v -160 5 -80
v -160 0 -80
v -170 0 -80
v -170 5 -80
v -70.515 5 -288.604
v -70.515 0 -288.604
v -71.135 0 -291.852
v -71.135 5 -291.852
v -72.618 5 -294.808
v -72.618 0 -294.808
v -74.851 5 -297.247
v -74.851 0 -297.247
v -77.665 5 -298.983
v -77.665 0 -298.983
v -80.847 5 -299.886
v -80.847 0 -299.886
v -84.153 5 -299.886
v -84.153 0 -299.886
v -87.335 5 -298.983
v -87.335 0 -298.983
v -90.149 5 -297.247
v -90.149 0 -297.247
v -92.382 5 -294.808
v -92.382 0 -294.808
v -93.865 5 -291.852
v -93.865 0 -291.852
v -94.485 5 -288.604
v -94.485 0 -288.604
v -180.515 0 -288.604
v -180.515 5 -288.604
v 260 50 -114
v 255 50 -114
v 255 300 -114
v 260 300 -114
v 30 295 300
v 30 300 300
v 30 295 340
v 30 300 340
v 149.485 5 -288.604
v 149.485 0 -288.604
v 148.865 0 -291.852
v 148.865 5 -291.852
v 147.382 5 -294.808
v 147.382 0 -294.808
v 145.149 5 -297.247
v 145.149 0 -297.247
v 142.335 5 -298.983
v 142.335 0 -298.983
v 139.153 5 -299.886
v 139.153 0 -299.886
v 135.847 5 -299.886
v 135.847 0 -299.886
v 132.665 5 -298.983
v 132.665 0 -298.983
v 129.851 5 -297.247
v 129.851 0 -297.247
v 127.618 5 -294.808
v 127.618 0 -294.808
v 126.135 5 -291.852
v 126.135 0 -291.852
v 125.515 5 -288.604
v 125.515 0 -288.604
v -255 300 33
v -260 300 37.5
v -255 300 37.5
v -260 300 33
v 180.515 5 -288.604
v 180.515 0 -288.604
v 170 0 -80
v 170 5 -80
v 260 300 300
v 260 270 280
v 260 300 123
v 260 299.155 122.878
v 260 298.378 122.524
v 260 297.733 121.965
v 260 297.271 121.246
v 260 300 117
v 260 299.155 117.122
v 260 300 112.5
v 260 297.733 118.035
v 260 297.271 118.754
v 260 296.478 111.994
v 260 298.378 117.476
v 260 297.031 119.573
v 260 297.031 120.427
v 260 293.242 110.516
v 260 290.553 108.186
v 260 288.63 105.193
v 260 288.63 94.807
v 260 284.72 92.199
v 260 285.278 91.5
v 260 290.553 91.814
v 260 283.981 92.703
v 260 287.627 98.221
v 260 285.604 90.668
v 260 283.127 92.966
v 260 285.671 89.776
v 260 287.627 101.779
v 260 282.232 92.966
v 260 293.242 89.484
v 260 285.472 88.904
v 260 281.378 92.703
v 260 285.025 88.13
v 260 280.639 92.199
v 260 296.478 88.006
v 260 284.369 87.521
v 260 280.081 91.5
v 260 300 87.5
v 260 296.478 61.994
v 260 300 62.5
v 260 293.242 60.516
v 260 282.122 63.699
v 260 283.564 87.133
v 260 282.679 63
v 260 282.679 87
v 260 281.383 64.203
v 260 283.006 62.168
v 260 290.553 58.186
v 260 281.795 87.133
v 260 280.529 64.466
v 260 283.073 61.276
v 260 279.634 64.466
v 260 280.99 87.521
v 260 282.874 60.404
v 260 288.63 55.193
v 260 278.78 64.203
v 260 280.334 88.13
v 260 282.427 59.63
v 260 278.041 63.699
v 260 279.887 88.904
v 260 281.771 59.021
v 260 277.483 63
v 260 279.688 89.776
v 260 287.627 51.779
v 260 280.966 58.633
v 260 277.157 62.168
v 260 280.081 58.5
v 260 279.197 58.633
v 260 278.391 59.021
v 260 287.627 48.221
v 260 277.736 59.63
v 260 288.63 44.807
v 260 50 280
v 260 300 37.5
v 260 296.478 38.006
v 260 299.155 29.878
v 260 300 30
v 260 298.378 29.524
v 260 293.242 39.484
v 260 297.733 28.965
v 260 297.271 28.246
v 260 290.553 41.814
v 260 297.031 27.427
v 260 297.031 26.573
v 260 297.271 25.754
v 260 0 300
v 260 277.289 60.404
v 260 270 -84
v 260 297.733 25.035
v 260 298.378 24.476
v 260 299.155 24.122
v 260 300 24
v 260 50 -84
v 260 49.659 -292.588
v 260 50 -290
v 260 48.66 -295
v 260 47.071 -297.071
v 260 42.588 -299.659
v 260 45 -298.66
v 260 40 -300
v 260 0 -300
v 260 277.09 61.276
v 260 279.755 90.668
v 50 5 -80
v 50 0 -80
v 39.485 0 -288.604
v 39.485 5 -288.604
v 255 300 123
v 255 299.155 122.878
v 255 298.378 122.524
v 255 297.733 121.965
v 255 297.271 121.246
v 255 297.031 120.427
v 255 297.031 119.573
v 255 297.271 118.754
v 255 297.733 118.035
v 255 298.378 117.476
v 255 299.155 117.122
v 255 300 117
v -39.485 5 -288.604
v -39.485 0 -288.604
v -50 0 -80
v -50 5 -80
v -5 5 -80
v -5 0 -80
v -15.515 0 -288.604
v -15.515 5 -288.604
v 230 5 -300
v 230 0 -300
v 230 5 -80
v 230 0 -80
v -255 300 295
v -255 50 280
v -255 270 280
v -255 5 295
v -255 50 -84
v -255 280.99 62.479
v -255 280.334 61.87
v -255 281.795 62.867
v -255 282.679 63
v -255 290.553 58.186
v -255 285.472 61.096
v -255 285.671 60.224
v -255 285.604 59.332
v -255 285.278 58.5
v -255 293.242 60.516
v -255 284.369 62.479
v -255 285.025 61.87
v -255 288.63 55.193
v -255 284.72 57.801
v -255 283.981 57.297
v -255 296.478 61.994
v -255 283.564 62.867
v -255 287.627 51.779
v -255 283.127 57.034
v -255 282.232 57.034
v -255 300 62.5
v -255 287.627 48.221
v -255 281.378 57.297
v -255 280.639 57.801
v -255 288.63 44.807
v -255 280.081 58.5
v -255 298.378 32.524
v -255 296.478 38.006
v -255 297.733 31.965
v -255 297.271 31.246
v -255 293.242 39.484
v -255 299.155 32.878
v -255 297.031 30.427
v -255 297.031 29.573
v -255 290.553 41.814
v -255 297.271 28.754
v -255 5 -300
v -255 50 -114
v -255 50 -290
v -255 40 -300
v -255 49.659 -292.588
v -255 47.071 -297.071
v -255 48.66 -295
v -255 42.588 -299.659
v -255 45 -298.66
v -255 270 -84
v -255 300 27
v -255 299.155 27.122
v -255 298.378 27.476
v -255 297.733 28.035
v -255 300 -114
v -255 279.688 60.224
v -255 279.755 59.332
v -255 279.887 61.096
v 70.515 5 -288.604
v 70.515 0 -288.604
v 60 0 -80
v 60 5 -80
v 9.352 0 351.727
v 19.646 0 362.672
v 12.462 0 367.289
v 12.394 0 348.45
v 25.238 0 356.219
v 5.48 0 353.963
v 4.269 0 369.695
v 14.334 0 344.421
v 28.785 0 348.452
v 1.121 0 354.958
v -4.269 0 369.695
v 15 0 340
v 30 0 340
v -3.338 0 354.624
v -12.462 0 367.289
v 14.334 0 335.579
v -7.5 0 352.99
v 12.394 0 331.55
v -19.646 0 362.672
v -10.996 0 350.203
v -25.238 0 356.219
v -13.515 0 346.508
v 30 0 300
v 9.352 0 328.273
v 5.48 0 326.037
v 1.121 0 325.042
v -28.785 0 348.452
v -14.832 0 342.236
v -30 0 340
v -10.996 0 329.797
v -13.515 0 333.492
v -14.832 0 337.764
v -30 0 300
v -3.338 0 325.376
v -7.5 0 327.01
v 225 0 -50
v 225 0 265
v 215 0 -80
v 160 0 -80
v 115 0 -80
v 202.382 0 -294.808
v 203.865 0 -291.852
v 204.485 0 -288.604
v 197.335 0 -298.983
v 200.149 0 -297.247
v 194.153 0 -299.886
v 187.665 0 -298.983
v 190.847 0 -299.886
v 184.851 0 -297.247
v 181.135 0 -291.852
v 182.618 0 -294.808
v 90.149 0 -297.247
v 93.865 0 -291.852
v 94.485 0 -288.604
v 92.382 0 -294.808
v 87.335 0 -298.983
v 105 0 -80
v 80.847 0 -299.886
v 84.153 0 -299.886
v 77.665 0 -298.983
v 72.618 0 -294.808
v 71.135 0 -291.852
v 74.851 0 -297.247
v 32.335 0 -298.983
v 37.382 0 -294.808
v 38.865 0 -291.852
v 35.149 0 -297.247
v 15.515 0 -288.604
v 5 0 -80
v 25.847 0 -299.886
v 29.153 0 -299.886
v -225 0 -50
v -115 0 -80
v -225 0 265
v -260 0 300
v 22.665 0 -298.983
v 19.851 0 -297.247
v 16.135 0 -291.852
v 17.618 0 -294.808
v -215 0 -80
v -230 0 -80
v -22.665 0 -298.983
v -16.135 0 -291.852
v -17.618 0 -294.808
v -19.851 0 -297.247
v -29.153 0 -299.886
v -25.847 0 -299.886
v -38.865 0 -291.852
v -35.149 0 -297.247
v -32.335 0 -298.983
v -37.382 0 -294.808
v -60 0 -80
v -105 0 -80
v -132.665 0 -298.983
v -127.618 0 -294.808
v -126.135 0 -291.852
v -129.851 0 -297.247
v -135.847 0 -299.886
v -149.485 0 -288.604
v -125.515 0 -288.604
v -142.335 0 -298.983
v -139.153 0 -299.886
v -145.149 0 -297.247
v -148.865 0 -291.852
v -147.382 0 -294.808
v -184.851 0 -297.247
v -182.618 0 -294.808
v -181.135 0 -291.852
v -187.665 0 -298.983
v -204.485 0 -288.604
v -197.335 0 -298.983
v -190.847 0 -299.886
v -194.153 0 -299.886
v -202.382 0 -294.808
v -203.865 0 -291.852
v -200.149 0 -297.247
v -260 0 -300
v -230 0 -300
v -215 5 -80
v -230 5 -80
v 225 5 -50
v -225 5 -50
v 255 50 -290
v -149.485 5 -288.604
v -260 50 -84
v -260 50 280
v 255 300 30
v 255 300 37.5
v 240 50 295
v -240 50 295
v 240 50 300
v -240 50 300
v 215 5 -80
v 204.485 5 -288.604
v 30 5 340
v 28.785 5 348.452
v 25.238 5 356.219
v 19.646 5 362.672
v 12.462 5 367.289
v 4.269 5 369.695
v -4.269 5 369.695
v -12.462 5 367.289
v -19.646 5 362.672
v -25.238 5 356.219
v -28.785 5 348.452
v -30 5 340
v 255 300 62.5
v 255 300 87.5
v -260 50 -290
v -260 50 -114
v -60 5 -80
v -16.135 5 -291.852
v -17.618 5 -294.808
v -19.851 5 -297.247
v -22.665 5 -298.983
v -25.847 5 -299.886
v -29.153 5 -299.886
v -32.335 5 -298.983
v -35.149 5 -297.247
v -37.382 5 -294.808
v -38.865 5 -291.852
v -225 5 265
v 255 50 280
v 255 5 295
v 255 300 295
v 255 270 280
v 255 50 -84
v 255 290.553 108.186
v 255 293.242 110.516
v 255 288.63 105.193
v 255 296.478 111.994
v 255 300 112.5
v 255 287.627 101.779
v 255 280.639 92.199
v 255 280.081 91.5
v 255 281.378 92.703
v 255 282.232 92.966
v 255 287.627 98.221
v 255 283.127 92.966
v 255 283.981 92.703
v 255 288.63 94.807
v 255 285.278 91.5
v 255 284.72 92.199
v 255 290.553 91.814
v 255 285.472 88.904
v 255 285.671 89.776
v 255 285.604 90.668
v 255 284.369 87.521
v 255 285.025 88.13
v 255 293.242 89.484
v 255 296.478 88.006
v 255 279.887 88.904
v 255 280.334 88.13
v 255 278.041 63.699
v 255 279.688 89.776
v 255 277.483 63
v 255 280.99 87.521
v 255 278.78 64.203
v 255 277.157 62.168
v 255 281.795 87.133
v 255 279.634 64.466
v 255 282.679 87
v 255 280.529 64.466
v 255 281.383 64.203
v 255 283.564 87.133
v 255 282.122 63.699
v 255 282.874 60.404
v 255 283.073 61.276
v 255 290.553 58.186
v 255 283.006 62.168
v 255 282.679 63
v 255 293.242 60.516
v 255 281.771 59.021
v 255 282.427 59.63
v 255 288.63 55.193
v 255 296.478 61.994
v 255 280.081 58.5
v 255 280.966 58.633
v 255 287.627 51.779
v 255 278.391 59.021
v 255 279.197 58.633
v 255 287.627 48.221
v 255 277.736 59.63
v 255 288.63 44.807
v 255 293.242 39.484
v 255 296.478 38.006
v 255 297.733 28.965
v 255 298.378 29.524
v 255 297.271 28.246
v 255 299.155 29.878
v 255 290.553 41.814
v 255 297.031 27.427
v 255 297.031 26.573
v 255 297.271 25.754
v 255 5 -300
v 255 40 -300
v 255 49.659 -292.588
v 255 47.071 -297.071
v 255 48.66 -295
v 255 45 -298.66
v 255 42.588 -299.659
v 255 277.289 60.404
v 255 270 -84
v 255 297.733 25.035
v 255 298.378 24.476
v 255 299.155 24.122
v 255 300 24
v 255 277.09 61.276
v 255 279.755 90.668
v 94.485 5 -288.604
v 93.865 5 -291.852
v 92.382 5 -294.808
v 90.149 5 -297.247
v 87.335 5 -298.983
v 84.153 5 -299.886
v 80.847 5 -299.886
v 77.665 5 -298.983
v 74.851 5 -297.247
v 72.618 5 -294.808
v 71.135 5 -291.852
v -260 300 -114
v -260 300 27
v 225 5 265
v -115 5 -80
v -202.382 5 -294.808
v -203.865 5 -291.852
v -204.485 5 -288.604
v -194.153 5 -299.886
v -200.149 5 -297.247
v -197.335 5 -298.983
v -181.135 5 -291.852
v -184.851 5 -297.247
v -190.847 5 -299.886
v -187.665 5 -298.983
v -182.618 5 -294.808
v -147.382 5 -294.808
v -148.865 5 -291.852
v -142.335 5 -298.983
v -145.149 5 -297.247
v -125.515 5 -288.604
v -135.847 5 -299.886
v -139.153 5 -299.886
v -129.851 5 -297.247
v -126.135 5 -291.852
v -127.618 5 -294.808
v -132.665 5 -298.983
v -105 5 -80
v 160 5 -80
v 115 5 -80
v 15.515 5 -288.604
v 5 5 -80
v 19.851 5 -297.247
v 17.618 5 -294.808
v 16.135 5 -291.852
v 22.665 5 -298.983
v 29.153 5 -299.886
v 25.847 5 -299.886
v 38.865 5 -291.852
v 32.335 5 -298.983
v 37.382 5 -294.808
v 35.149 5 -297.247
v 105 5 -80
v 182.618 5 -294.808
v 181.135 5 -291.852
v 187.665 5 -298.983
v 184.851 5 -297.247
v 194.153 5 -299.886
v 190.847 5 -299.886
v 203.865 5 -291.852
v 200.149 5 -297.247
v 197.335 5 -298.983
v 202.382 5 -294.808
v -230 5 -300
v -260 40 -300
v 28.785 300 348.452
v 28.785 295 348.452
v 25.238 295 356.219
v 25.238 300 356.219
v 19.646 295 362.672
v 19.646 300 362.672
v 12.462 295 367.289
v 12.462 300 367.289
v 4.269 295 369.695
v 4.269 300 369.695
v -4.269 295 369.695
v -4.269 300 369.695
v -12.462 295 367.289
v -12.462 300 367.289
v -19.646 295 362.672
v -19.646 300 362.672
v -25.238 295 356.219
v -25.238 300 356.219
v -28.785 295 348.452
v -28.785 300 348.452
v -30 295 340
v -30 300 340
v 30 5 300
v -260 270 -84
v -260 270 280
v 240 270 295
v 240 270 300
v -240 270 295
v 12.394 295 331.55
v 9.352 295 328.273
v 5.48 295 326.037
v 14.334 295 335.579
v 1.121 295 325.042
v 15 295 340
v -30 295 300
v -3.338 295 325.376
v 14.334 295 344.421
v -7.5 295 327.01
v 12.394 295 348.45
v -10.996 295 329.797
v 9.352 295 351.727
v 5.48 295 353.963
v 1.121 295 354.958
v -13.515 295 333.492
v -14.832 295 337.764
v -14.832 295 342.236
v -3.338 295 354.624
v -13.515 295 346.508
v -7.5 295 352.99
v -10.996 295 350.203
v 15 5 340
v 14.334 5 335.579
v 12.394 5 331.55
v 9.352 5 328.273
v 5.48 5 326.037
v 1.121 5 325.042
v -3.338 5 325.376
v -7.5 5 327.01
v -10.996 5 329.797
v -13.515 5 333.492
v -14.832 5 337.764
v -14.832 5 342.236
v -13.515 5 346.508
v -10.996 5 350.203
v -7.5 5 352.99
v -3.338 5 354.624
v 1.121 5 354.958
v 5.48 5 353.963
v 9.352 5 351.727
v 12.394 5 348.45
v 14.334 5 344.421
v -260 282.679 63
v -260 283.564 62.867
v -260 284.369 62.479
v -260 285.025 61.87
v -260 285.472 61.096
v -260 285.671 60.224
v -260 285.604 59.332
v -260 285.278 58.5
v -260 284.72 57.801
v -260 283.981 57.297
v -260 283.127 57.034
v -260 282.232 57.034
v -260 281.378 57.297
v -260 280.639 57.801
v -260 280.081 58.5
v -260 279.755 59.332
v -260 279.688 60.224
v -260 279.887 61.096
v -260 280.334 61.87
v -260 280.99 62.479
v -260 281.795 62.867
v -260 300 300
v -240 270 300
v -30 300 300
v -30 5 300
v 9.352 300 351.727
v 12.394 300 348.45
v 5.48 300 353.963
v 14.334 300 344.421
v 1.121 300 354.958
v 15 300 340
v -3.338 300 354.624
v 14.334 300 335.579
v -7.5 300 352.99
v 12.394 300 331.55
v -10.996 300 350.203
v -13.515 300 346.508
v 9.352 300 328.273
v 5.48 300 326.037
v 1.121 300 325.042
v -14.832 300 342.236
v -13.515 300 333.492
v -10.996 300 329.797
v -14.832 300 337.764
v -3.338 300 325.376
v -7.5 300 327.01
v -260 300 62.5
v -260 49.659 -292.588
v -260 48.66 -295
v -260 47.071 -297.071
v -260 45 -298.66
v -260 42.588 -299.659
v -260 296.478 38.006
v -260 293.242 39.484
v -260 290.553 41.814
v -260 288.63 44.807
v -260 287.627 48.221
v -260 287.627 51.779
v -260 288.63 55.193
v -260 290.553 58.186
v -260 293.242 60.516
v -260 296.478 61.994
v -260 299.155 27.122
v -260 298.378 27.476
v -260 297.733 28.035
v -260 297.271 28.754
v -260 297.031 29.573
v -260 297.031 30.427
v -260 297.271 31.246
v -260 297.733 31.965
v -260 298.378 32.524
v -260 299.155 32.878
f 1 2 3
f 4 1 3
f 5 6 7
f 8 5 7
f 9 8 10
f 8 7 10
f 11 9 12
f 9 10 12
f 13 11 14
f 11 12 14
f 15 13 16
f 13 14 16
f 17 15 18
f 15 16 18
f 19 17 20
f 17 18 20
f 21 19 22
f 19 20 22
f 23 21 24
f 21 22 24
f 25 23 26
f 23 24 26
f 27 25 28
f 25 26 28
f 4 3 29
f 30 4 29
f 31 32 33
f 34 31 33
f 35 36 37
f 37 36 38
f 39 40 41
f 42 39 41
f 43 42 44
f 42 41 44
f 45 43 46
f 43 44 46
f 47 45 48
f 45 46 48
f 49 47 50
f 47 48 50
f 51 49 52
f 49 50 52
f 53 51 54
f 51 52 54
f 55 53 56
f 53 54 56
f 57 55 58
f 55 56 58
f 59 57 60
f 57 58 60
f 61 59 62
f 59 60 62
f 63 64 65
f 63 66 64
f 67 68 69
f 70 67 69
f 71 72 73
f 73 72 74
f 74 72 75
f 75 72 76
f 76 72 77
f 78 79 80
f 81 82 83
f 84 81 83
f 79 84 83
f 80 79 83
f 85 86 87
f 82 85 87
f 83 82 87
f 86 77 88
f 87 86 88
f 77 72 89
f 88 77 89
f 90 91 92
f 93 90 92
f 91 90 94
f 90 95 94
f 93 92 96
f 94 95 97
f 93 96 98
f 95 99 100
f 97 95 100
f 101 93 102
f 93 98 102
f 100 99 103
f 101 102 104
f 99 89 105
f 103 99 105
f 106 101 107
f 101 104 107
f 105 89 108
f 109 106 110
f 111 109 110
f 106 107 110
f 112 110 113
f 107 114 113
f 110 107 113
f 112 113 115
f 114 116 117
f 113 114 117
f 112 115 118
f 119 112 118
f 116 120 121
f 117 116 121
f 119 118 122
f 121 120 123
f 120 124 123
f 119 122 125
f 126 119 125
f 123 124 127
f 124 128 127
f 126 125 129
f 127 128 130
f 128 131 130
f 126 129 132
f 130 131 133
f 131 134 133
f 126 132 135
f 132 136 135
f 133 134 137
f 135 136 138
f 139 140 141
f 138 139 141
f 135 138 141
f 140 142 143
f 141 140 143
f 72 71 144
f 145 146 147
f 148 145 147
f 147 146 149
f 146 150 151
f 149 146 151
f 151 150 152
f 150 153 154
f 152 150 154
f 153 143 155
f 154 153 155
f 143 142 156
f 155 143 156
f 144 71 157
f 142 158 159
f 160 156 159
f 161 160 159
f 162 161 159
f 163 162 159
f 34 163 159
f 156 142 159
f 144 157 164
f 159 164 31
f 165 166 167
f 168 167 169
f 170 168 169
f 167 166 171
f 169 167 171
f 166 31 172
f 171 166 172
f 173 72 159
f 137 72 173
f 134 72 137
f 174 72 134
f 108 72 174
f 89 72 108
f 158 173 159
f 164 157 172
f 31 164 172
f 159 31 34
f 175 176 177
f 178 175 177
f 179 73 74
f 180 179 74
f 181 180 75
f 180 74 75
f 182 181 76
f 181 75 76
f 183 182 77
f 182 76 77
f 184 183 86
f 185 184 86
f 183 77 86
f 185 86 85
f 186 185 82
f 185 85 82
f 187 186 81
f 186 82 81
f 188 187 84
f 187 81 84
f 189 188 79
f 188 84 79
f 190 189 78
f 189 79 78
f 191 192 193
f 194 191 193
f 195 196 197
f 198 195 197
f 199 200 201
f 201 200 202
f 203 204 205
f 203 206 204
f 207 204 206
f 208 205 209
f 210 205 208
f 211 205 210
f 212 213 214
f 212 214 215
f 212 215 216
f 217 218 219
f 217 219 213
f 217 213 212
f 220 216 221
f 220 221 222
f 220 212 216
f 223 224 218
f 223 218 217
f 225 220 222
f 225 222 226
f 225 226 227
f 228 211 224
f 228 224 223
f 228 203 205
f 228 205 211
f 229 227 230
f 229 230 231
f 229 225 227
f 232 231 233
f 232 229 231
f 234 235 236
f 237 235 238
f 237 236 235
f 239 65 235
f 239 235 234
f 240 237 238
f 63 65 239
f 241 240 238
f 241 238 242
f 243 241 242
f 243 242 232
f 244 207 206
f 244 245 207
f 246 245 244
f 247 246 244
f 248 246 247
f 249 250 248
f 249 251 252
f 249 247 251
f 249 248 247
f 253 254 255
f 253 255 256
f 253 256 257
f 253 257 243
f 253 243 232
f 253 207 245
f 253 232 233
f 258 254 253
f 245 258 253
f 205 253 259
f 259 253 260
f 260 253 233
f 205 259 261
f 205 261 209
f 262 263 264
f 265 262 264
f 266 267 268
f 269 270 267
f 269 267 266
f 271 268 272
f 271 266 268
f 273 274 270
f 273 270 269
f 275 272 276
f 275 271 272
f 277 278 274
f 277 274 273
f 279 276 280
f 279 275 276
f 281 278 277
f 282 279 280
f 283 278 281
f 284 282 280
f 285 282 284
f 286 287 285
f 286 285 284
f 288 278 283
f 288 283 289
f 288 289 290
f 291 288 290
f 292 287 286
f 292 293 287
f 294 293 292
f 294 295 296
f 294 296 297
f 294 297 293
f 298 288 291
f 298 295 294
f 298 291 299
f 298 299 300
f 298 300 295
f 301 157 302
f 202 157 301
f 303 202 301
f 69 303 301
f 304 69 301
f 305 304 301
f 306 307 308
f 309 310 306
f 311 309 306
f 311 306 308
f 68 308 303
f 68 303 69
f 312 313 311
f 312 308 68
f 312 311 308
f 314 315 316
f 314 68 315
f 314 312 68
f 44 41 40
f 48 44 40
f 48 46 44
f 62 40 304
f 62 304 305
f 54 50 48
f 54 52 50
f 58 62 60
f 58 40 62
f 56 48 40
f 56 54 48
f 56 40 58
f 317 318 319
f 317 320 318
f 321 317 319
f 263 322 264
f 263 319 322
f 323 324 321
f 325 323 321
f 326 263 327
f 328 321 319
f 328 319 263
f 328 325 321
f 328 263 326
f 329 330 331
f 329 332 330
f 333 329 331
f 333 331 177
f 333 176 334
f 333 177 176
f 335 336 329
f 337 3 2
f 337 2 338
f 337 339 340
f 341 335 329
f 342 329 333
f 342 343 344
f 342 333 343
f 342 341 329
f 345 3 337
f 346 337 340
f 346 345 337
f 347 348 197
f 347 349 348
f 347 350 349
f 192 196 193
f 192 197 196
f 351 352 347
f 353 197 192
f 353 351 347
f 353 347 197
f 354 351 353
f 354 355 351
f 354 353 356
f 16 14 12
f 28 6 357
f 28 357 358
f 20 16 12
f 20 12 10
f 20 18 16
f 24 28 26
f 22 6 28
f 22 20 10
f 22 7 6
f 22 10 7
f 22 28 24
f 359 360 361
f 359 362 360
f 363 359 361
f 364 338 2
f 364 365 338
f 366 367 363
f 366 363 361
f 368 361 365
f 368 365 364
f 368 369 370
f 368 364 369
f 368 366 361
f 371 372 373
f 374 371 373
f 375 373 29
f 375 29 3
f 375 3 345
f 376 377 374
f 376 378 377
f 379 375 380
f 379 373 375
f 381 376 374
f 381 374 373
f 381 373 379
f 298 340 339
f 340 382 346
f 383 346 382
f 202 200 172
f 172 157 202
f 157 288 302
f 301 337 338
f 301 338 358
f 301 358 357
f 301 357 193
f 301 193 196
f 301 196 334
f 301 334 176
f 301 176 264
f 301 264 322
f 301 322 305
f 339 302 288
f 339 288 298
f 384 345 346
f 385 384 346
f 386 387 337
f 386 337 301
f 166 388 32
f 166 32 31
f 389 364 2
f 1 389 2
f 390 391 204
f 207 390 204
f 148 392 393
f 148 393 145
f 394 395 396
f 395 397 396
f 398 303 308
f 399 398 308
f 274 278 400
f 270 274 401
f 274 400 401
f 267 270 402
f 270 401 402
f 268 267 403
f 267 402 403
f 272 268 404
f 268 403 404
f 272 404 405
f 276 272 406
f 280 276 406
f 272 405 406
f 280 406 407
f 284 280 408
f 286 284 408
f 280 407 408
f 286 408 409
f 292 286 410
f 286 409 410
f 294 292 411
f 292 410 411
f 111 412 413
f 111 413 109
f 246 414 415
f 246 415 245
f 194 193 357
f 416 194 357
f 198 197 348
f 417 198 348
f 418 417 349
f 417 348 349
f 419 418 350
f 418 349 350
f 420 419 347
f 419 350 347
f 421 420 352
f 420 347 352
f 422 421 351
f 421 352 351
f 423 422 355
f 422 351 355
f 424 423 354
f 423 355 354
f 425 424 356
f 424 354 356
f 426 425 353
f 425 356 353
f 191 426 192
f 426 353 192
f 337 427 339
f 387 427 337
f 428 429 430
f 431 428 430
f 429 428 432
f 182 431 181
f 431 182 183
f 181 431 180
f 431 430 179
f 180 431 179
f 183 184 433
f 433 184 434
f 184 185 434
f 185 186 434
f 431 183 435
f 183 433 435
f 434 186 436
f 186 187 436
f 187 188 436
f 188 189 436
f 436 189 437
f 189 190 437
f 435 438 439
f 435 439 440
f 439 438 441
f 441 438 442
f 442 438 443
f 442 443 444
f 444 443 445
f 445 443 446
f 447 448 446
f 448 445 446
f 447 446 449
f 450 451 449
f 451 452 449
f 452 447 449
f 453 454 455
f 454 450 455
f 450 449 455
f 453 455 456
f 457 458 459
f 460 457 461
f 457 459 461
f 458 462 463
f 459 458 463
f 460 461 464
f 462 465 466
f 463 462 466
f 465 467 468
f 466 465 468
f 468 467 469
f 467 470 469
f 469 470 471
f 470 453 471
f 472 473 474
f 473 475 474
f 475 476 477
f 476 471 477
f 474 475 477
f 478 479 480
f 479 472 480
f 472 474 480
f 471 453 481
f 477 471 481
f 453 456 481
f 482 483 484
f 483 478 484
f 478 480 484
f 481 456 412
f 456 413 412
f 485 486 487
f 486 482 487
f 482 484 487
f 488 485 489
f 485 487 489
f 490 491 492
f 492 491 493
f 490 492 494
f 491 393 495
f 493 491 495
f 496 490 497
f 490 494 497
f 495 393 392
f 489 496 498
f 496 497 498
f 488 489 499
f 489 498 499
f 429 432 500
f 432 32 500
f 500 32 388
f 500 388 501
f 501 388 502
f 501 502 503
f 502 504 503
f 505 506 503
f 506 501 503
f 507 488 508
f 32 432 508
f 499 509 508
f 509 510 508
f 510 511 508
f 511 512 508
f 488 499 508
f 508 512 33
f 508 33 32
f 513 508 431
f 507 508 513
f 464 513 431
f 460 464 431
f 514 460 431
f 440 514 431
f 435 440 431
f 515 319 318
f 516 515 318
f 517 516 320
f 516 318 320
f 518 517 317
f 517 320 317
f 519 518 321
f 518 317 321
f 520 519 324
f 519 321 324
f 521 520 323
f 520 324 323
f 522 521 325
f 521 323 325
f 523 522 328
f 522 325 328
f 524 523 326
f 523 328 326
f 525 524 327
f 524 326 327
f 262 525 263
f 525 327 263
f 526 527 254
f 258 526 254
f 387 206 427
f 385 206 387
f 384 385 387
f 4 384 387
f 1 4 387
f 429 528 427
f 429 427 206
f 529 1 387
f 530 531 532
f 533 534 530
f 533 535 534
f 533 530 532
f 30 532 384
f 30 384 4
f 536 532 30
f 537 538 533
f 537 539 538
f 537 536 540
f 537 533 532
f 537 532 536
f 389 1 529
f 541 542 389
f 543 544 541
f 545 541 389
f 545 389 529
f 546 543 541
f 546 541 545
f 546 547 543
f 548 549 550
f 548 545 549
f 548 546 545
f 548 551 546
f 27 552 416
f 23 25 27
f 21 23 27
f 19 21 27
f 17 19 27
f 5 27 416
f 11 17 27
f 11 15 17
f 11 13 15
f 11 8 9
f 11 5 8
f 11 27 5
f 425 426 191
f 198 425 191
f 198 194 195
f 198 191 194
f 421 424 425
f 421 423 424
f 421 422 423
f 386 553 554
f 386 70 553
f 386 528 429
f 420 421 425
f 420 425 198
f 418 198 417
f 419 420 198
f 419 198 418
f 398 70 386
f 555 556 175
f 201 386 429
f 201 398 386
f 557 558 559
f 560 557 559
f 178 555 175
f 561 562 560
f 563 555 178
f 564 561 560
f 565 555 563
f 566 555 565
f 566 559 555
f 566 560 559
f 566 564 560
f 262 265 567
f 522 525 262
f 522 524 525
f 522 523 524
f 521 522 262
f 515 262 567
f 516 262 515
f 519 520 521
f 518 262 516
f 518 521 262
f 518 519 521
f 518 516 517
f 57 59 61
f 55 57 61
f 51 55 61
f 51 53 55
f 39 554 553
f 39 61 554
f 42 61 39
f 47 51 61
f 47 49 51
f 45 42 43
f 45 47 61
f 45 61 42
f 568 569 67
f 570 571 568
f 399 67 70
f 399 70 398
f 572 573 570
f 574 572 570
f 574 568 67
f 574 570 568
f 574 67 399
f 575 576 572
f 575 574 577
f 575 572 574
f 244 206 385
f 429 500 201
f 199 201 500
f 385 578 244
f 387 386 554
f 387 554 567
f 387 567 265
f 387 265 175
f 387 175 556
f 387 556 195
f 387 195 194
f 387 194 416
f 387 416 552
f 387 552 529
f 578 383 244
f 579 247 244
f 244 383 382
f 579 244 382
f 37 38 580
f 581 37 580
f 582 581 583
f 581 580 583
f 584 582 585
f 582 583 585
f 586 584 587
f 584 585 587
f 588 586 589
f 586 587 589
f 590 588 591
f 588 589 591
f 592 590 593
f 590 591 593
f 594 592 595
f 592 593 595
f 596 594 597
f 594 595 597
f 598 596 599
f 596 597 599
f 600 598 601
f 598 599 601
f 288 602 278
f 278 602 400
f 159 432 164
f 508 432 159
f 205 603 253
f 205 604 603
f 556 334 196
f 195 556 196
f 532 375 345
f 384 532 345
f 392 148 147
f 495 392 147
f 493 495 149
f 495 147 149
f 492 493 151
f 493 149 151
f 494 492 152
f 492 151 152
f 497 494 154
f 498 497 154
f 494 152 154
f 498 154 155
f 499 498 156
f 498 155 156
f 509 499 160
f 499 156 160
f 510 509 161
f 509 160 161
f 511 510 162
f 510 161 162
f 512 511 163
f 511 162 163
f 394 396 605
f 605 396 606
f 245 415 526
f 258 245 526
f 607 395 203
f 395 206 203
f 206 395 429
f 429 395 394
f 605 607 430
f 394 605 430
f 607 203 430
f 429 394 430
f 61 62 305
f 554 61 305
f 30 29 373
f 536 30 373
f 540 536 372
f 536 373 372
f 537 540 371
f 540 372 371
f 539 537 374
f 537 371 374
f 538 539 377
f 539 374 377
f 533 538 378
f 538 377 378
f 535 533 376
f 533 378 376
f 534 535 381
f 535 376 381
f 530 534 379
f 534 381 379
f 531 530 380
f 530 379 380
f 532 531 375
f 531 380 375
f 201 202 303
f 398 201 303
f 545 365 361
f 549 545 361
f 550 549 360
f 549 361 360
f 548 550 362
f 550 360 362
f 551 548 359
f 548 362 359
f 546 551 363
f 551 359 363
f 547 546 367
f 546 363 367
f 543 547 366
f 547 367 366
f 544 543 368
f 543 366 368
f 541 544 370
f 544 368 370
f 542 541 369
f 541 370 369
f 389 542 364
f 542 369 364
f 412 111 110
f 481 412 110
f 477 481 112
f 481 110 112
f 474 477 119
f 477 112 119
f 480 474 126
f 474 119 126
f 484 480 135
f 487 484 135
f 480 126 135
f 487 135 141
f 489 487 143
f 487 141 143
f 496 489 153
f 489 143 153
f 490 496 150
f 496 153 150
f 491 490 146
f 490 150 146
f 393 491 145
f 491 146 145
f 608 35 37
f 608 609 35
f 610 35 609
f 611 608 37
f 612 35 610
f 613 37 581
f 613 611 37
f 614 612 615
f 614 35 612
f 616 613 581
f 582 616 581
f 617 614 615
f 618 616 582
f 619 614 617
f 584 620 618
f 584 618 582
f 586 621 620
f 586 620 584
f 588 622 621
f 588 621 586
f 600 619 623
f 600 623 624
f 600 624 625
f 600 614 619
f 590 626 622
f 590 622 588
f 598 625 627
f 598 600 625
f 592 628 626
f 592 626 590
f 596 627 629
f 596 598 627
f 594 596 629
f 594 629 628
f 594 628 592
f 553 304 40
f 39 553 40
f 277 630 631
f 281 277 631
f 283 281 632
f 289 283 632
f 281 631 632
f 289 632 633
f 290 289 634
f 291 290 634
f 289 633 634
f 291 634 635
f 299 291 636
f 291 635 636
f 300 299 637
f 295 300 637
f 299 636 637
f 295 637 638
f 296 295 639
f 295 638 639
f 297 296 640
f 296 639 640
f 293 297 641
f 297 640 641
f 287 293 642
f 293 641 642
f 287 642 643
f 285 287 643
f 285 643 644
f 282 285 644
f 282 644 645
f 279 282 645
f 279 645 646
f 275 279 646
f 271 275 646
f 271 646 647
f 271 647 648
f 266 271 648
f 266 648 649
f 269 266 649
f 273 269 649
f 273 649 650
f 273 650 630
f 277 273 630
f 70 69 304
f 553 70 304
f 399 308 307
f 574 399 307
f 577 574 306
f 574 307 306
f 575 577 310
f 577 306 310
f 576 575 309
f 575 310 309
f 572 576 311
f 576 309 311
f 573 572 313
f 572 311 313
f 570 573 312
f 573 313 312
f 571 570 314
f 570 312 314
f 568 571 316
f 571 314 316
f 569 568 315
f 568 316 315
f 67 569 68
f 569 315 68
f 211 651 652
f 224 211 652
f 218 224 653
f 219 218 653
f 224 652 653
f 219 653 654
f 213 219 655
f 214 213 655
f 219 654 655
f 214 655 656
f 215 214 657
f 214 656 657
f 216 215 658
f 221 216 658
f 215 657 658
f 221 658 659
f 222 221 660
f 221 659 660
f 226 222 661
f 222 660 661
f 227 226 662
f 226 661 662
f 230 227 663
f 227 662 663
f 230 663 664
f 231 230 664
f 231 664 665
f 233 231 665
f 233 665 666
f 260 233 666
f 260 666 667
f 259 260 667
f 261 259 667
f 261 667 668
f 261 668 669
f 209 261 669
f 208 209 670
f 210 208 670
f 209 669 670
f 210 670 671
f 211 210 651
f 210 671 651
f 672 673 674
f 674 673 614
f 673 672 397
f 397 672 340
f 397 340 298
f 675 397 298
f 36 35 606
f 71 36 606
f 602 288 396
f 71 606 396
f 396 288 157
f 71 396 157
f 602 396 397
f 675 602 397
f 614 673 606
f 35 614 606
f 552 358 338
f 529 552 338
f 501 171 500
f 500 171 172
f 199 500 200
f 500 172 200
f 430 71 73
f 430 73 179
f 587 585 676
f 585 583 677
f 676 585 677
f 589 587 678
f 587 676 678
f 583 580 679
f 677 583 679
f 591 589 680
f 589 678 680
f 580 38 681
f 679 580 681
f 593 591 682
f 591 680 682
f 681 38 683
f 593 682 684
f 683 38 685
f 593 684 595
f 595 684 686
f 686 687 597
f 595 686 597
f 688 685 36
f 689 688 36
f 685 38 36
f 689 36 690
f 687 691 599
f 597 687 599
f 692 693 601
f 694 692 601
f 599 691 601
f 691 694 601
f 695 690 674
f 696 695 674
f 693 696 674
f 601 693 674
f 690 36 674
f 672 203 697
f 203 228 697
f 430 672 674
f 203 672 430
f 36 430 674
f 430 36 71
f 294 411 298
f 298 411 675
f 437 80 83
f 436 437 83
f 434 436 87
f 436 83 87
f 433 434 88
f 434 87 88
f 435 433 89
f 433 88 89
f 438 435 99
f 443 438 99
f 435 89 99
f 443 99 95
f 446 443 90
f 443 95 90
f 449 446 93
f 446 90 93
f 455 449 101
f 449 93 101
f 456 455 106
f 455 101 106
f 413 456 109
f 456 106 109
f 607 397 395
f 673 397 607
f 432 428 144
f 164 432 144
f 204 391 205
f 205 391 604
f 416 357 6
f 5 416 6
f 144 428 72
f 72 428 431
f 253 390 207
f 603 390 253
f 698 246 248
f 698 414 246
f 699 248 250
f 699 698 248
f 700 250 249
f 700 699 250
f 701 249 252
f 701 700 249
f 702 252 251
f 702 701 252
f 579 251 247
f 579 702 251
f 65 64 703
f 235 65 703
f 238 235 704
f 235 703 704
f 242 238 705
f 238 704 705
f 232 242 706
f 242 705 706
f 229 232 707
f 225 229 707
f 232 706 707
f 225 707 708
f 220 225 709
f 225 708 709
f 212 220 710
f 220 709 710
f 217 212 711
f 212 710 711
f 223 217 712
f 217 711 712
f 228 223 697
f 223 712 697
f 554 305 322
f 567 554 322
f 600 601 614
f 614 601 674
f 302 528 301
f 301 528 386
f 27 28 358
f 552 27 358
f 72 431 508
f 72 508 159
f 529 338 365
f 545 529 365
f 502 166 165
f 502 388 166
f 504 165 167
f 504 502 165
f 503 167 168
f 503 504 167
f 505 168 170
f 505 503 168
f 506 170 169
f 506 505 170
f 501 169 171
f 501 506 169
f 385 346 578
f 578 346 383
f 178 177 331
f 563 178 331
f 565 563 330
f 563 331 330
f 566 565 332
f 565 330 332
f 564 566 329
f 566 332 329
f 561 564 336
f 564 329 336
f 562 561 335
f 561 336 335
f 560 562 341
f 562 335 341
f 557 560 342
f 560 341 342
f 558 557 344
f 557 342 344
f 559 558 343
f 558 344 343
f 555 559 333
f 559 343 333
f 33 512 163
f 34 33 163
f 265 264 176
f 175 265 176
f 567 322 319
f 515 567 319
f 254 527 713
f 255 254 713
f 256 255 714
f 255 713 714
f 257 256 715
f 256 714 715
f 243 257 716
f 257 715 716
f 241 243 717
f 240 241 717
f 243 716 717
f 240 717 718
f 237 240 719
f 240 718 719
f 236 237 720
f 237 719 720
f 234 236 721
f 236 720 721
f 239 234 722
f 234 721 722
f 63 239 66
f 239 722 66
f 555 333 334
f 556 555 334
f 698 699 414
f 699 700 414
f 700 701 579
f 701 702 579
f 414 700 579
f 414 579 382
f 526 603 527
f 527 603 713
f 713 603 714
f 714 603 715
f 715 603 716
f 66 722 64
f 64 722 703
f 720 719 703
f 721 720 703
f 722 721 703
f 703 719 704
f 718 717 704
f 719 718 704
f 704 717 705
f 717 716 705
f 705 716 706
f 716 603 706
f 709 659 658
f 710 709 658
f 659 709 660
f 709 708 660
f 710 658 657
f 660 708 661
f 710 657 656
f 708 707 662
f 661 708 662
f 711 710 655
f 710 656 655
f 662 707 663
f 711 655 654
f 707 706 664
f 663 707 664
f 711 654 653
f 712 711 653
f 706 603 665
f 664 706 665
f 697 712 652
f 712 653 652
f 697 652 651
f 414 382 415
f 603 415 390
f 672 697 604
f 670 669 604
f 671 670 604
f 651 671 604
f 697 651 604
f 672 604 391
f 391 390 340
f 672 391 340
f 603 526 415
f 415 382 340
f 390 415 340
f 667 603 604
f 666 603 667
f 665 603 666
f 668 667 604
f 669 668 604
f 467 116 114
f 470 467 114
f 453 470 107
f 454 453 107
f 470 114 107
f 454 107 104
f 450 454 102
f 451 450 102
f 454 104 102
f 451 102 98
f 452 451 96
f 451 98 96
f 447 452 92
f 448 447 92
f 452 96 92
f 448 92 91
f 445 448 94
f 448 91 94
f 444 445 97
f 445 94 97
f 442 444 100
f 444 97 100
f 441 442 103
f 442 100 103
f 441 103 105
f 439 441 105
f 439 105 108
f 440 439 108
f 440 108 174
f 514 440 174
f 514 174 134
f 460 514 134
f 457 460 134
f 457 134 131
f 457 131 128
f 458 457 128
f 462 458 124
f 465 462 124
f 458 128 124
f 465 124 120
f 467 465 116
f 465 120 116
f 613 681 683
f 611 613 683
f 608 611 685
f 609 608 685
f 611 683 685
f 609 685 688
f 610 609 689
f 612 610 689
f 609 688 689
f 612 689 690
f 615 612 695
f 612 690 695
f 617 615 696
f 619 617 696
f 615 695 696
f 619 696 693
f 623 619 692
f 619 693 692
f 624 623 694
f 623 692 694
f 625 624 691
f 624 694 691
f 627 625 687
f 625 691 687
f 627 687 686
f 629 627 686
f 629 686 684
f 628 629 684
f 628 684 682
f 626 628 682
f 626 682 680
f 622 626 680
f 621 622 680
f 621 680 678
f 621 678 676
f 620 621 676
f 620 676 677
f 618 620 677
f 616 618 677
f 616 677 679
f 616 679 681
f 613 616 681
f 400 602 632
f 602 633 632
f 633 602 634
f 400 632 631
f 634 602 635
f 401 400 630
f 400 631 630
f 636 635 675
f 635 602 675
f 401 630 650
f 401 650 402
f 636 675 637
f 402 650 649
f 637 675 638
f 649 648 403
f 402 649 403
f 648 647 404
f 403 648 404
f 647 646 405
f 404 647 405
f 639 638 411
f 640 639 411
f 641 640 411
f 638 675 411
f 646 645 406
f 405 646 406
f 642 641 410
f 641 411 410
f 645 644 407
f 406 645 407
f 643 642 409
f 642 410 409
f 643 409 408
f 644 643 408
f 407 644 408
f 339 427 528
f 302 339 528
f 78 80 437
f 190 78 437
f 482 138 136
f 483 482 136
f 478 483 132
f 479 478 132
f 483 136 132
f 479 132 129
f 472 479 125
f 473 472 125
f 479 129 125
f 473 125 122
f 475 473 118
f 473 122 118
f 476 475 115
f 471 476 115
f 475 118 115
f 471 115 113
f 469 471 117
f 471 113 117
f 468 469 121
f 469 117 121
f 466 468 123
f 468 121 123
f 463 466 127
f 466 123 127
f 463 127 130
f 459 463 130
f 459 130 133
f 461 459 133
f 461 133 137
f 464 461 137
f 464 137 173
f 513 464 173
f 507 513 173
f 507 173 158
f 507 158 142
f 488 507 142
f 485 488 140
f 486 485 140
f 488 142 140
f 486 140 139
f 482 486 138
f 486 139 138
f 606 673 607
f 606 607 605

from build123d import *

# Parameters (mm, degrees)
EXTRUDE_1_DEPTH      = 300
SKETCH_2_W           = 480
SKETCH_2_H           = 220
CUT_EXTRUDE_1_DEPTH  = 601
SKETCH_3_W           = 364
SKETCH_3_H           = 220
CUT_EXTRUDE_2_DEPTH  = 520
SKETCH_5_W           = 186
SKETCH_5_H           = 250
CUT_EXTRUDE_4_DEPTH  = 520
SKETCH_6_W           = 510
SKETCH_6_H           = 800
CUT_EXTRUDE_5_DEPTH  = 295
CUT_EXTRUDE_3_REACH  = 522
SKETCH_4_R           = 12.5
SKETCH_12_R          = 12.5
CUT_EXTRUDE_8_DEPTH  = 10
SKETCH_7_R           = 15
EXTRUDE_2_DEPTH      = 300
CUT_EXTRUDE_6_REACH  = 292
SKETCH_8_W           = 177.621372849
SKETCH_8_H           = 290
SKETCH_10_W          = 450
SKETCH_10_H          = 315
CUT_EXTRUDE_7_DEPTH  = 51
FILLET_1_R           = 10
SKETCH_15_R          = 3
CUT_EXTRUDE_10_DEPTH = 5
SKETCH_16_R          = 3
CUT_EXTRUDE_11_DEPTH = 5
SKETCH_17_R          = 3
CUT_EXTRUDE_12_DEPTH = 5


with BuildPart() as part:
    # 草图1 → 凸台-拉伸1 (new body)
    with BuildSketch(Plane(origin=(0, 0, 0), x_dir=(1, 0, 0), z_dir=(0, 1, 0))):
        with BuildLine():
            Line((-215, 80), (-230, 80))
            Line((-230, 80), (-230, 300))
            Line((-230, 300), (-260, 300))
            Line((-260, 300), (-260, -300))
            Line((-260, -300), (260, -300))
            Line((260, -300), (260, 300))
            Line((260, 300), (230, 300))
            Line((230, 300), (230, 80))
            Line((230, 80), (215, 80))
            Line((215, 80), (204.484783483, 288.604123213))
            ThreePointArc((204.484783483, 288.604123213), (192.5, 300), (180.515216517, 288.604123213))
            Line((180.515216517, 288.604123213), (170, 80))
            Line((170, 80), (160, 80))
            Line((160, 80), (149.484783483, 288.604123213))
            ThreePointArc((149.484783483, 288.604123213), (137.5, 300), (125.515216517, 288.604123213))
            Line((125.515216517, 288.604123213), (115, 80))
            Line((115, 80), (105, 80))
            Line((105, 80), (94.484783483, 288.604123213))
            ThreePointArc((94.484783483, 288.604123213), (82.5, 300), (70.515216517, 288.604123213))
            Line((70.515216517, 288.604123213), (60, 80))
            Line((60, 80), (50, 80))
            Line((50, 80), (39.484783483, 288.604123213))
            ThreePointArc((39.484783483, 288.604123213), (27.5, 300), (15.515216517, 288.604123213))
            Line((15.515216517, 288.604123213), (5, 80))
            Line((5, 80), (-5, 80))
            Line((-5, 80), (-15.515216517, 288.604123213))
            ThreePointArc((-15.515216517, 288.604123213), (-27.5, 300), (-39.484783483, 288.604123213))
            Line((-39.484783483, 288.604123213), (-50, 80))
            Line((-50, 80), (-60, 80))
            Line((-60, 80), (-70.515216517, 288.604123213))
            ThreePointArc((-70.515216517, 288.604123213), (-82.5, 300), (-94.484783483, 288.604123213))
            Line((-94.484783483, 288.604123213), (-105, 80))
            Line((-105, 80), (-115, 80))
            Line((-115, 80), (-125.515216517, 288.604123213))
            ThreePointArc((-125.515216517, 288.604123213), (-137.5, 300), (-149.484783483, 288.604123213))
            Line((-149.484783483, 288.604123213), (-160, 80))
            Line((-160, 80), (-170, 80))
            Line((-170, 80), (-180.515216517, 288.604123213))
            ThreePointArc((-180.515216517, 288.604123213), (-192.5, 300), (-204.484783483, 288.604123213))
            Line((-204.484783483, 288.604123213), (-215, 80))
        make_face()
    extrude(amount=EXTRUDE_1_DEPTH)

    # 草图2 → 切除-拉伸1 (cut, through all)
    with BuildSketch(Plane.XY.offset(300)):
        with Locations((0, 160)):
            Rectangle(SKETCH_2_W, SKETCH_2_H)
    extrude(amount=-CUT_EXTRUDE_1_DEPTH, mode=Mode.SUBTRACT)

    # 草图3 → 切除-拉伸2 (cut)
    with BuildSketch(Plane.ZY.offset(260)):
        with Locations((98, 160)):
            Rectangle(SKETCH_3_W, SKETCH_3_H)
    extrude(amount=-CUT_EXTRUDE_2_DEPTH, mode=Mode.SUBTRACT)

    # 草图5 → 切除-拉伸4 (cut)
    with BuildSketch(Plane.ZY.offset(260)):
        with Locations((-207, 175)):
            Rectangle(SKETCH_5_W, SKETCH_5_H)
    extrude(amount=-CUT_EXTRUDE_4_DEPTH, mode=Mode.SUBTRACT)

    # 草图6 → 切除-拉伸5 (cut)
    with BuildSketch(Plane(origin=(0, 300, 0), x_dir=(1, 0, 0), z_dir=(0, 1, 0))):
        with Locations((0, 105)):
            Rectangle(SKETCH_6_W, SKETCH_6_H)
    extrude(amount=-CUT_EXTRUDE_5_DEPTH, mode=Mode.SUBTRACT)

    # 草图4 → 切除-拉伸3 (cut, up to next)
    with BuildSketch(Plane.ZY.offset(260), mode=Mode.PRIVATE) as cut_extrude_3_sk1:
        with Locations((50, 300)):
            Circle(SKETCH_4_R)
    cut_extrude_3_tool1 = extrude(cut_extrude_3_sk1.sketch, amount=-CUT_EXTRUDE_3_REACH, mode=Mode.PRIVATE) & part.part
    add(cut_extrude_3_tool1.solids().sort_by_distance((-260, 300, 50))[0], mode=Mode.SUBTRACT)

    # 草图12 → 切除-拉伸8 (cut)
    with BuildSketch(Plane(origin=(260, 0, 0), x_dir=(0, 0, -1), z_dir=(1, 0, 0))):
        with Locations((-100, 300)):
            Circle(SKETCH_12_R)
        with Locations((-50, 300)):
            Circle(SKETCH_12_R)
    extrude(amount=-CUT_EXTRUDE_8_DEPTH, mode=Mode.SUBTRACT)

    # 草图7 → 凸台-拉伸2 (add)
    with BuildSketch(Plane(origin=(0, 300, 0), x_dir=(1, 0, 0), z_dir=(0, 1, 0))):
        with BuildLine():
            Line((-30, -340), (-30, -300))
            Line((-30, -300), (30, -300))
            Line((30, -300), (30, -340))
            ThreePointArc((30, -340), (0, -370), (-30, -340))
        make_face()
        with Locations((0, -340)):
            Circle(SKETCH_7_R, mode=Mode.SUBTRACT)
    extrude(amount=-EXTRUDE_2_DEPTH)

    # 草图8 → 切除-拉伸6 (cut, up to next)
    with BuildSketch(Plane.ZY.offset(30), mode=Mode.PRIVATE) as cut_extrude_6_sk1:
        with Locations((388.810686424, 150)):
            Rectangle(SKETCH_8_W, SKETCH_8_H)
    cut_extrude_6_tool1 = extrude(cut_extrude_6_sk1.sketch, amount=-CUT_EXTRUDE_6_REACH, mode=Mode.PRIVATE) & part.part
    add(cut_extrude_6_tool1.solids().sort_by_distance((-30, 150, 388.810686))[0], mode=Mode.SUBTRACT)

    # 草图10 → 切除-拉伸7 (cut, through all)
    with BuildSketch(Plane(origin=(0, 50, 0), x_dir=(1, 0, 0), z_dir=(0, 1, 0))):
        with Locations((0, -107.5)):
            Rectangle(SKETCH_10_W, SKETCH_10_H)
    extrude(amount=-CUT_EXTRUDE_7_DEPTH, mode=Mode.SUBTRACT)

    # 圆角1
    fillet_1_edges = [part.edges().sort_by_distance(p)[0] for p in [
        (-257.5, 50, -300),
        (257.5, 50, -300),
    ]]
    fillet(fillet_1_edges, radius=FILLET_1_R)

    # 草图15 → 切除-拉伸10 (cut)
    with BuildSketch(Plane(origin=(260, 0, 0), x_dir=(0, 0, -1), z_dir=(1, 0, 0))):
        with Locations((-120, 300)):
            Circle(SKETCH_15_R)
        with Locations((-90, 282.679491924)):
            Circle(SKETCH_15_R)
    extrude(amount=-CUT_EXTRUDE_10_DEPTH, mode=Mode.SUBTRACT)

    # 草图16 → 切除-拉伸11 (cut)
    with BuildSketch(Plane.ZY.offset(260)):
        with Locations((30, 300)):
            Circle(SKETCH_16_R)
        with Locations((60, 282.679491924)):
            Circle(SKETCH_16_R)
    extrude(amount=-CUT_EXTRUDE_11_DEPTH, mode=Mode.SUBTRACT)

    # 草图17 → 切除-拉伸12 (cut)
    with BuildSketch(Plane(origin=(260, 0, 0), x_dir=(0, 0, -1), z_dir=(1, 0, 0))):
        with Locations((-27, 300)):
            Circle(SKETCH_17_R)
        with Locations((-61.5, 280.081415713)):
            Circle(SKETCH_17_R)
    extrude(amount=-CUT_EXTRUDE_12_DEPTH, mode=Mode.SUBTRACT)


solid = part.part
